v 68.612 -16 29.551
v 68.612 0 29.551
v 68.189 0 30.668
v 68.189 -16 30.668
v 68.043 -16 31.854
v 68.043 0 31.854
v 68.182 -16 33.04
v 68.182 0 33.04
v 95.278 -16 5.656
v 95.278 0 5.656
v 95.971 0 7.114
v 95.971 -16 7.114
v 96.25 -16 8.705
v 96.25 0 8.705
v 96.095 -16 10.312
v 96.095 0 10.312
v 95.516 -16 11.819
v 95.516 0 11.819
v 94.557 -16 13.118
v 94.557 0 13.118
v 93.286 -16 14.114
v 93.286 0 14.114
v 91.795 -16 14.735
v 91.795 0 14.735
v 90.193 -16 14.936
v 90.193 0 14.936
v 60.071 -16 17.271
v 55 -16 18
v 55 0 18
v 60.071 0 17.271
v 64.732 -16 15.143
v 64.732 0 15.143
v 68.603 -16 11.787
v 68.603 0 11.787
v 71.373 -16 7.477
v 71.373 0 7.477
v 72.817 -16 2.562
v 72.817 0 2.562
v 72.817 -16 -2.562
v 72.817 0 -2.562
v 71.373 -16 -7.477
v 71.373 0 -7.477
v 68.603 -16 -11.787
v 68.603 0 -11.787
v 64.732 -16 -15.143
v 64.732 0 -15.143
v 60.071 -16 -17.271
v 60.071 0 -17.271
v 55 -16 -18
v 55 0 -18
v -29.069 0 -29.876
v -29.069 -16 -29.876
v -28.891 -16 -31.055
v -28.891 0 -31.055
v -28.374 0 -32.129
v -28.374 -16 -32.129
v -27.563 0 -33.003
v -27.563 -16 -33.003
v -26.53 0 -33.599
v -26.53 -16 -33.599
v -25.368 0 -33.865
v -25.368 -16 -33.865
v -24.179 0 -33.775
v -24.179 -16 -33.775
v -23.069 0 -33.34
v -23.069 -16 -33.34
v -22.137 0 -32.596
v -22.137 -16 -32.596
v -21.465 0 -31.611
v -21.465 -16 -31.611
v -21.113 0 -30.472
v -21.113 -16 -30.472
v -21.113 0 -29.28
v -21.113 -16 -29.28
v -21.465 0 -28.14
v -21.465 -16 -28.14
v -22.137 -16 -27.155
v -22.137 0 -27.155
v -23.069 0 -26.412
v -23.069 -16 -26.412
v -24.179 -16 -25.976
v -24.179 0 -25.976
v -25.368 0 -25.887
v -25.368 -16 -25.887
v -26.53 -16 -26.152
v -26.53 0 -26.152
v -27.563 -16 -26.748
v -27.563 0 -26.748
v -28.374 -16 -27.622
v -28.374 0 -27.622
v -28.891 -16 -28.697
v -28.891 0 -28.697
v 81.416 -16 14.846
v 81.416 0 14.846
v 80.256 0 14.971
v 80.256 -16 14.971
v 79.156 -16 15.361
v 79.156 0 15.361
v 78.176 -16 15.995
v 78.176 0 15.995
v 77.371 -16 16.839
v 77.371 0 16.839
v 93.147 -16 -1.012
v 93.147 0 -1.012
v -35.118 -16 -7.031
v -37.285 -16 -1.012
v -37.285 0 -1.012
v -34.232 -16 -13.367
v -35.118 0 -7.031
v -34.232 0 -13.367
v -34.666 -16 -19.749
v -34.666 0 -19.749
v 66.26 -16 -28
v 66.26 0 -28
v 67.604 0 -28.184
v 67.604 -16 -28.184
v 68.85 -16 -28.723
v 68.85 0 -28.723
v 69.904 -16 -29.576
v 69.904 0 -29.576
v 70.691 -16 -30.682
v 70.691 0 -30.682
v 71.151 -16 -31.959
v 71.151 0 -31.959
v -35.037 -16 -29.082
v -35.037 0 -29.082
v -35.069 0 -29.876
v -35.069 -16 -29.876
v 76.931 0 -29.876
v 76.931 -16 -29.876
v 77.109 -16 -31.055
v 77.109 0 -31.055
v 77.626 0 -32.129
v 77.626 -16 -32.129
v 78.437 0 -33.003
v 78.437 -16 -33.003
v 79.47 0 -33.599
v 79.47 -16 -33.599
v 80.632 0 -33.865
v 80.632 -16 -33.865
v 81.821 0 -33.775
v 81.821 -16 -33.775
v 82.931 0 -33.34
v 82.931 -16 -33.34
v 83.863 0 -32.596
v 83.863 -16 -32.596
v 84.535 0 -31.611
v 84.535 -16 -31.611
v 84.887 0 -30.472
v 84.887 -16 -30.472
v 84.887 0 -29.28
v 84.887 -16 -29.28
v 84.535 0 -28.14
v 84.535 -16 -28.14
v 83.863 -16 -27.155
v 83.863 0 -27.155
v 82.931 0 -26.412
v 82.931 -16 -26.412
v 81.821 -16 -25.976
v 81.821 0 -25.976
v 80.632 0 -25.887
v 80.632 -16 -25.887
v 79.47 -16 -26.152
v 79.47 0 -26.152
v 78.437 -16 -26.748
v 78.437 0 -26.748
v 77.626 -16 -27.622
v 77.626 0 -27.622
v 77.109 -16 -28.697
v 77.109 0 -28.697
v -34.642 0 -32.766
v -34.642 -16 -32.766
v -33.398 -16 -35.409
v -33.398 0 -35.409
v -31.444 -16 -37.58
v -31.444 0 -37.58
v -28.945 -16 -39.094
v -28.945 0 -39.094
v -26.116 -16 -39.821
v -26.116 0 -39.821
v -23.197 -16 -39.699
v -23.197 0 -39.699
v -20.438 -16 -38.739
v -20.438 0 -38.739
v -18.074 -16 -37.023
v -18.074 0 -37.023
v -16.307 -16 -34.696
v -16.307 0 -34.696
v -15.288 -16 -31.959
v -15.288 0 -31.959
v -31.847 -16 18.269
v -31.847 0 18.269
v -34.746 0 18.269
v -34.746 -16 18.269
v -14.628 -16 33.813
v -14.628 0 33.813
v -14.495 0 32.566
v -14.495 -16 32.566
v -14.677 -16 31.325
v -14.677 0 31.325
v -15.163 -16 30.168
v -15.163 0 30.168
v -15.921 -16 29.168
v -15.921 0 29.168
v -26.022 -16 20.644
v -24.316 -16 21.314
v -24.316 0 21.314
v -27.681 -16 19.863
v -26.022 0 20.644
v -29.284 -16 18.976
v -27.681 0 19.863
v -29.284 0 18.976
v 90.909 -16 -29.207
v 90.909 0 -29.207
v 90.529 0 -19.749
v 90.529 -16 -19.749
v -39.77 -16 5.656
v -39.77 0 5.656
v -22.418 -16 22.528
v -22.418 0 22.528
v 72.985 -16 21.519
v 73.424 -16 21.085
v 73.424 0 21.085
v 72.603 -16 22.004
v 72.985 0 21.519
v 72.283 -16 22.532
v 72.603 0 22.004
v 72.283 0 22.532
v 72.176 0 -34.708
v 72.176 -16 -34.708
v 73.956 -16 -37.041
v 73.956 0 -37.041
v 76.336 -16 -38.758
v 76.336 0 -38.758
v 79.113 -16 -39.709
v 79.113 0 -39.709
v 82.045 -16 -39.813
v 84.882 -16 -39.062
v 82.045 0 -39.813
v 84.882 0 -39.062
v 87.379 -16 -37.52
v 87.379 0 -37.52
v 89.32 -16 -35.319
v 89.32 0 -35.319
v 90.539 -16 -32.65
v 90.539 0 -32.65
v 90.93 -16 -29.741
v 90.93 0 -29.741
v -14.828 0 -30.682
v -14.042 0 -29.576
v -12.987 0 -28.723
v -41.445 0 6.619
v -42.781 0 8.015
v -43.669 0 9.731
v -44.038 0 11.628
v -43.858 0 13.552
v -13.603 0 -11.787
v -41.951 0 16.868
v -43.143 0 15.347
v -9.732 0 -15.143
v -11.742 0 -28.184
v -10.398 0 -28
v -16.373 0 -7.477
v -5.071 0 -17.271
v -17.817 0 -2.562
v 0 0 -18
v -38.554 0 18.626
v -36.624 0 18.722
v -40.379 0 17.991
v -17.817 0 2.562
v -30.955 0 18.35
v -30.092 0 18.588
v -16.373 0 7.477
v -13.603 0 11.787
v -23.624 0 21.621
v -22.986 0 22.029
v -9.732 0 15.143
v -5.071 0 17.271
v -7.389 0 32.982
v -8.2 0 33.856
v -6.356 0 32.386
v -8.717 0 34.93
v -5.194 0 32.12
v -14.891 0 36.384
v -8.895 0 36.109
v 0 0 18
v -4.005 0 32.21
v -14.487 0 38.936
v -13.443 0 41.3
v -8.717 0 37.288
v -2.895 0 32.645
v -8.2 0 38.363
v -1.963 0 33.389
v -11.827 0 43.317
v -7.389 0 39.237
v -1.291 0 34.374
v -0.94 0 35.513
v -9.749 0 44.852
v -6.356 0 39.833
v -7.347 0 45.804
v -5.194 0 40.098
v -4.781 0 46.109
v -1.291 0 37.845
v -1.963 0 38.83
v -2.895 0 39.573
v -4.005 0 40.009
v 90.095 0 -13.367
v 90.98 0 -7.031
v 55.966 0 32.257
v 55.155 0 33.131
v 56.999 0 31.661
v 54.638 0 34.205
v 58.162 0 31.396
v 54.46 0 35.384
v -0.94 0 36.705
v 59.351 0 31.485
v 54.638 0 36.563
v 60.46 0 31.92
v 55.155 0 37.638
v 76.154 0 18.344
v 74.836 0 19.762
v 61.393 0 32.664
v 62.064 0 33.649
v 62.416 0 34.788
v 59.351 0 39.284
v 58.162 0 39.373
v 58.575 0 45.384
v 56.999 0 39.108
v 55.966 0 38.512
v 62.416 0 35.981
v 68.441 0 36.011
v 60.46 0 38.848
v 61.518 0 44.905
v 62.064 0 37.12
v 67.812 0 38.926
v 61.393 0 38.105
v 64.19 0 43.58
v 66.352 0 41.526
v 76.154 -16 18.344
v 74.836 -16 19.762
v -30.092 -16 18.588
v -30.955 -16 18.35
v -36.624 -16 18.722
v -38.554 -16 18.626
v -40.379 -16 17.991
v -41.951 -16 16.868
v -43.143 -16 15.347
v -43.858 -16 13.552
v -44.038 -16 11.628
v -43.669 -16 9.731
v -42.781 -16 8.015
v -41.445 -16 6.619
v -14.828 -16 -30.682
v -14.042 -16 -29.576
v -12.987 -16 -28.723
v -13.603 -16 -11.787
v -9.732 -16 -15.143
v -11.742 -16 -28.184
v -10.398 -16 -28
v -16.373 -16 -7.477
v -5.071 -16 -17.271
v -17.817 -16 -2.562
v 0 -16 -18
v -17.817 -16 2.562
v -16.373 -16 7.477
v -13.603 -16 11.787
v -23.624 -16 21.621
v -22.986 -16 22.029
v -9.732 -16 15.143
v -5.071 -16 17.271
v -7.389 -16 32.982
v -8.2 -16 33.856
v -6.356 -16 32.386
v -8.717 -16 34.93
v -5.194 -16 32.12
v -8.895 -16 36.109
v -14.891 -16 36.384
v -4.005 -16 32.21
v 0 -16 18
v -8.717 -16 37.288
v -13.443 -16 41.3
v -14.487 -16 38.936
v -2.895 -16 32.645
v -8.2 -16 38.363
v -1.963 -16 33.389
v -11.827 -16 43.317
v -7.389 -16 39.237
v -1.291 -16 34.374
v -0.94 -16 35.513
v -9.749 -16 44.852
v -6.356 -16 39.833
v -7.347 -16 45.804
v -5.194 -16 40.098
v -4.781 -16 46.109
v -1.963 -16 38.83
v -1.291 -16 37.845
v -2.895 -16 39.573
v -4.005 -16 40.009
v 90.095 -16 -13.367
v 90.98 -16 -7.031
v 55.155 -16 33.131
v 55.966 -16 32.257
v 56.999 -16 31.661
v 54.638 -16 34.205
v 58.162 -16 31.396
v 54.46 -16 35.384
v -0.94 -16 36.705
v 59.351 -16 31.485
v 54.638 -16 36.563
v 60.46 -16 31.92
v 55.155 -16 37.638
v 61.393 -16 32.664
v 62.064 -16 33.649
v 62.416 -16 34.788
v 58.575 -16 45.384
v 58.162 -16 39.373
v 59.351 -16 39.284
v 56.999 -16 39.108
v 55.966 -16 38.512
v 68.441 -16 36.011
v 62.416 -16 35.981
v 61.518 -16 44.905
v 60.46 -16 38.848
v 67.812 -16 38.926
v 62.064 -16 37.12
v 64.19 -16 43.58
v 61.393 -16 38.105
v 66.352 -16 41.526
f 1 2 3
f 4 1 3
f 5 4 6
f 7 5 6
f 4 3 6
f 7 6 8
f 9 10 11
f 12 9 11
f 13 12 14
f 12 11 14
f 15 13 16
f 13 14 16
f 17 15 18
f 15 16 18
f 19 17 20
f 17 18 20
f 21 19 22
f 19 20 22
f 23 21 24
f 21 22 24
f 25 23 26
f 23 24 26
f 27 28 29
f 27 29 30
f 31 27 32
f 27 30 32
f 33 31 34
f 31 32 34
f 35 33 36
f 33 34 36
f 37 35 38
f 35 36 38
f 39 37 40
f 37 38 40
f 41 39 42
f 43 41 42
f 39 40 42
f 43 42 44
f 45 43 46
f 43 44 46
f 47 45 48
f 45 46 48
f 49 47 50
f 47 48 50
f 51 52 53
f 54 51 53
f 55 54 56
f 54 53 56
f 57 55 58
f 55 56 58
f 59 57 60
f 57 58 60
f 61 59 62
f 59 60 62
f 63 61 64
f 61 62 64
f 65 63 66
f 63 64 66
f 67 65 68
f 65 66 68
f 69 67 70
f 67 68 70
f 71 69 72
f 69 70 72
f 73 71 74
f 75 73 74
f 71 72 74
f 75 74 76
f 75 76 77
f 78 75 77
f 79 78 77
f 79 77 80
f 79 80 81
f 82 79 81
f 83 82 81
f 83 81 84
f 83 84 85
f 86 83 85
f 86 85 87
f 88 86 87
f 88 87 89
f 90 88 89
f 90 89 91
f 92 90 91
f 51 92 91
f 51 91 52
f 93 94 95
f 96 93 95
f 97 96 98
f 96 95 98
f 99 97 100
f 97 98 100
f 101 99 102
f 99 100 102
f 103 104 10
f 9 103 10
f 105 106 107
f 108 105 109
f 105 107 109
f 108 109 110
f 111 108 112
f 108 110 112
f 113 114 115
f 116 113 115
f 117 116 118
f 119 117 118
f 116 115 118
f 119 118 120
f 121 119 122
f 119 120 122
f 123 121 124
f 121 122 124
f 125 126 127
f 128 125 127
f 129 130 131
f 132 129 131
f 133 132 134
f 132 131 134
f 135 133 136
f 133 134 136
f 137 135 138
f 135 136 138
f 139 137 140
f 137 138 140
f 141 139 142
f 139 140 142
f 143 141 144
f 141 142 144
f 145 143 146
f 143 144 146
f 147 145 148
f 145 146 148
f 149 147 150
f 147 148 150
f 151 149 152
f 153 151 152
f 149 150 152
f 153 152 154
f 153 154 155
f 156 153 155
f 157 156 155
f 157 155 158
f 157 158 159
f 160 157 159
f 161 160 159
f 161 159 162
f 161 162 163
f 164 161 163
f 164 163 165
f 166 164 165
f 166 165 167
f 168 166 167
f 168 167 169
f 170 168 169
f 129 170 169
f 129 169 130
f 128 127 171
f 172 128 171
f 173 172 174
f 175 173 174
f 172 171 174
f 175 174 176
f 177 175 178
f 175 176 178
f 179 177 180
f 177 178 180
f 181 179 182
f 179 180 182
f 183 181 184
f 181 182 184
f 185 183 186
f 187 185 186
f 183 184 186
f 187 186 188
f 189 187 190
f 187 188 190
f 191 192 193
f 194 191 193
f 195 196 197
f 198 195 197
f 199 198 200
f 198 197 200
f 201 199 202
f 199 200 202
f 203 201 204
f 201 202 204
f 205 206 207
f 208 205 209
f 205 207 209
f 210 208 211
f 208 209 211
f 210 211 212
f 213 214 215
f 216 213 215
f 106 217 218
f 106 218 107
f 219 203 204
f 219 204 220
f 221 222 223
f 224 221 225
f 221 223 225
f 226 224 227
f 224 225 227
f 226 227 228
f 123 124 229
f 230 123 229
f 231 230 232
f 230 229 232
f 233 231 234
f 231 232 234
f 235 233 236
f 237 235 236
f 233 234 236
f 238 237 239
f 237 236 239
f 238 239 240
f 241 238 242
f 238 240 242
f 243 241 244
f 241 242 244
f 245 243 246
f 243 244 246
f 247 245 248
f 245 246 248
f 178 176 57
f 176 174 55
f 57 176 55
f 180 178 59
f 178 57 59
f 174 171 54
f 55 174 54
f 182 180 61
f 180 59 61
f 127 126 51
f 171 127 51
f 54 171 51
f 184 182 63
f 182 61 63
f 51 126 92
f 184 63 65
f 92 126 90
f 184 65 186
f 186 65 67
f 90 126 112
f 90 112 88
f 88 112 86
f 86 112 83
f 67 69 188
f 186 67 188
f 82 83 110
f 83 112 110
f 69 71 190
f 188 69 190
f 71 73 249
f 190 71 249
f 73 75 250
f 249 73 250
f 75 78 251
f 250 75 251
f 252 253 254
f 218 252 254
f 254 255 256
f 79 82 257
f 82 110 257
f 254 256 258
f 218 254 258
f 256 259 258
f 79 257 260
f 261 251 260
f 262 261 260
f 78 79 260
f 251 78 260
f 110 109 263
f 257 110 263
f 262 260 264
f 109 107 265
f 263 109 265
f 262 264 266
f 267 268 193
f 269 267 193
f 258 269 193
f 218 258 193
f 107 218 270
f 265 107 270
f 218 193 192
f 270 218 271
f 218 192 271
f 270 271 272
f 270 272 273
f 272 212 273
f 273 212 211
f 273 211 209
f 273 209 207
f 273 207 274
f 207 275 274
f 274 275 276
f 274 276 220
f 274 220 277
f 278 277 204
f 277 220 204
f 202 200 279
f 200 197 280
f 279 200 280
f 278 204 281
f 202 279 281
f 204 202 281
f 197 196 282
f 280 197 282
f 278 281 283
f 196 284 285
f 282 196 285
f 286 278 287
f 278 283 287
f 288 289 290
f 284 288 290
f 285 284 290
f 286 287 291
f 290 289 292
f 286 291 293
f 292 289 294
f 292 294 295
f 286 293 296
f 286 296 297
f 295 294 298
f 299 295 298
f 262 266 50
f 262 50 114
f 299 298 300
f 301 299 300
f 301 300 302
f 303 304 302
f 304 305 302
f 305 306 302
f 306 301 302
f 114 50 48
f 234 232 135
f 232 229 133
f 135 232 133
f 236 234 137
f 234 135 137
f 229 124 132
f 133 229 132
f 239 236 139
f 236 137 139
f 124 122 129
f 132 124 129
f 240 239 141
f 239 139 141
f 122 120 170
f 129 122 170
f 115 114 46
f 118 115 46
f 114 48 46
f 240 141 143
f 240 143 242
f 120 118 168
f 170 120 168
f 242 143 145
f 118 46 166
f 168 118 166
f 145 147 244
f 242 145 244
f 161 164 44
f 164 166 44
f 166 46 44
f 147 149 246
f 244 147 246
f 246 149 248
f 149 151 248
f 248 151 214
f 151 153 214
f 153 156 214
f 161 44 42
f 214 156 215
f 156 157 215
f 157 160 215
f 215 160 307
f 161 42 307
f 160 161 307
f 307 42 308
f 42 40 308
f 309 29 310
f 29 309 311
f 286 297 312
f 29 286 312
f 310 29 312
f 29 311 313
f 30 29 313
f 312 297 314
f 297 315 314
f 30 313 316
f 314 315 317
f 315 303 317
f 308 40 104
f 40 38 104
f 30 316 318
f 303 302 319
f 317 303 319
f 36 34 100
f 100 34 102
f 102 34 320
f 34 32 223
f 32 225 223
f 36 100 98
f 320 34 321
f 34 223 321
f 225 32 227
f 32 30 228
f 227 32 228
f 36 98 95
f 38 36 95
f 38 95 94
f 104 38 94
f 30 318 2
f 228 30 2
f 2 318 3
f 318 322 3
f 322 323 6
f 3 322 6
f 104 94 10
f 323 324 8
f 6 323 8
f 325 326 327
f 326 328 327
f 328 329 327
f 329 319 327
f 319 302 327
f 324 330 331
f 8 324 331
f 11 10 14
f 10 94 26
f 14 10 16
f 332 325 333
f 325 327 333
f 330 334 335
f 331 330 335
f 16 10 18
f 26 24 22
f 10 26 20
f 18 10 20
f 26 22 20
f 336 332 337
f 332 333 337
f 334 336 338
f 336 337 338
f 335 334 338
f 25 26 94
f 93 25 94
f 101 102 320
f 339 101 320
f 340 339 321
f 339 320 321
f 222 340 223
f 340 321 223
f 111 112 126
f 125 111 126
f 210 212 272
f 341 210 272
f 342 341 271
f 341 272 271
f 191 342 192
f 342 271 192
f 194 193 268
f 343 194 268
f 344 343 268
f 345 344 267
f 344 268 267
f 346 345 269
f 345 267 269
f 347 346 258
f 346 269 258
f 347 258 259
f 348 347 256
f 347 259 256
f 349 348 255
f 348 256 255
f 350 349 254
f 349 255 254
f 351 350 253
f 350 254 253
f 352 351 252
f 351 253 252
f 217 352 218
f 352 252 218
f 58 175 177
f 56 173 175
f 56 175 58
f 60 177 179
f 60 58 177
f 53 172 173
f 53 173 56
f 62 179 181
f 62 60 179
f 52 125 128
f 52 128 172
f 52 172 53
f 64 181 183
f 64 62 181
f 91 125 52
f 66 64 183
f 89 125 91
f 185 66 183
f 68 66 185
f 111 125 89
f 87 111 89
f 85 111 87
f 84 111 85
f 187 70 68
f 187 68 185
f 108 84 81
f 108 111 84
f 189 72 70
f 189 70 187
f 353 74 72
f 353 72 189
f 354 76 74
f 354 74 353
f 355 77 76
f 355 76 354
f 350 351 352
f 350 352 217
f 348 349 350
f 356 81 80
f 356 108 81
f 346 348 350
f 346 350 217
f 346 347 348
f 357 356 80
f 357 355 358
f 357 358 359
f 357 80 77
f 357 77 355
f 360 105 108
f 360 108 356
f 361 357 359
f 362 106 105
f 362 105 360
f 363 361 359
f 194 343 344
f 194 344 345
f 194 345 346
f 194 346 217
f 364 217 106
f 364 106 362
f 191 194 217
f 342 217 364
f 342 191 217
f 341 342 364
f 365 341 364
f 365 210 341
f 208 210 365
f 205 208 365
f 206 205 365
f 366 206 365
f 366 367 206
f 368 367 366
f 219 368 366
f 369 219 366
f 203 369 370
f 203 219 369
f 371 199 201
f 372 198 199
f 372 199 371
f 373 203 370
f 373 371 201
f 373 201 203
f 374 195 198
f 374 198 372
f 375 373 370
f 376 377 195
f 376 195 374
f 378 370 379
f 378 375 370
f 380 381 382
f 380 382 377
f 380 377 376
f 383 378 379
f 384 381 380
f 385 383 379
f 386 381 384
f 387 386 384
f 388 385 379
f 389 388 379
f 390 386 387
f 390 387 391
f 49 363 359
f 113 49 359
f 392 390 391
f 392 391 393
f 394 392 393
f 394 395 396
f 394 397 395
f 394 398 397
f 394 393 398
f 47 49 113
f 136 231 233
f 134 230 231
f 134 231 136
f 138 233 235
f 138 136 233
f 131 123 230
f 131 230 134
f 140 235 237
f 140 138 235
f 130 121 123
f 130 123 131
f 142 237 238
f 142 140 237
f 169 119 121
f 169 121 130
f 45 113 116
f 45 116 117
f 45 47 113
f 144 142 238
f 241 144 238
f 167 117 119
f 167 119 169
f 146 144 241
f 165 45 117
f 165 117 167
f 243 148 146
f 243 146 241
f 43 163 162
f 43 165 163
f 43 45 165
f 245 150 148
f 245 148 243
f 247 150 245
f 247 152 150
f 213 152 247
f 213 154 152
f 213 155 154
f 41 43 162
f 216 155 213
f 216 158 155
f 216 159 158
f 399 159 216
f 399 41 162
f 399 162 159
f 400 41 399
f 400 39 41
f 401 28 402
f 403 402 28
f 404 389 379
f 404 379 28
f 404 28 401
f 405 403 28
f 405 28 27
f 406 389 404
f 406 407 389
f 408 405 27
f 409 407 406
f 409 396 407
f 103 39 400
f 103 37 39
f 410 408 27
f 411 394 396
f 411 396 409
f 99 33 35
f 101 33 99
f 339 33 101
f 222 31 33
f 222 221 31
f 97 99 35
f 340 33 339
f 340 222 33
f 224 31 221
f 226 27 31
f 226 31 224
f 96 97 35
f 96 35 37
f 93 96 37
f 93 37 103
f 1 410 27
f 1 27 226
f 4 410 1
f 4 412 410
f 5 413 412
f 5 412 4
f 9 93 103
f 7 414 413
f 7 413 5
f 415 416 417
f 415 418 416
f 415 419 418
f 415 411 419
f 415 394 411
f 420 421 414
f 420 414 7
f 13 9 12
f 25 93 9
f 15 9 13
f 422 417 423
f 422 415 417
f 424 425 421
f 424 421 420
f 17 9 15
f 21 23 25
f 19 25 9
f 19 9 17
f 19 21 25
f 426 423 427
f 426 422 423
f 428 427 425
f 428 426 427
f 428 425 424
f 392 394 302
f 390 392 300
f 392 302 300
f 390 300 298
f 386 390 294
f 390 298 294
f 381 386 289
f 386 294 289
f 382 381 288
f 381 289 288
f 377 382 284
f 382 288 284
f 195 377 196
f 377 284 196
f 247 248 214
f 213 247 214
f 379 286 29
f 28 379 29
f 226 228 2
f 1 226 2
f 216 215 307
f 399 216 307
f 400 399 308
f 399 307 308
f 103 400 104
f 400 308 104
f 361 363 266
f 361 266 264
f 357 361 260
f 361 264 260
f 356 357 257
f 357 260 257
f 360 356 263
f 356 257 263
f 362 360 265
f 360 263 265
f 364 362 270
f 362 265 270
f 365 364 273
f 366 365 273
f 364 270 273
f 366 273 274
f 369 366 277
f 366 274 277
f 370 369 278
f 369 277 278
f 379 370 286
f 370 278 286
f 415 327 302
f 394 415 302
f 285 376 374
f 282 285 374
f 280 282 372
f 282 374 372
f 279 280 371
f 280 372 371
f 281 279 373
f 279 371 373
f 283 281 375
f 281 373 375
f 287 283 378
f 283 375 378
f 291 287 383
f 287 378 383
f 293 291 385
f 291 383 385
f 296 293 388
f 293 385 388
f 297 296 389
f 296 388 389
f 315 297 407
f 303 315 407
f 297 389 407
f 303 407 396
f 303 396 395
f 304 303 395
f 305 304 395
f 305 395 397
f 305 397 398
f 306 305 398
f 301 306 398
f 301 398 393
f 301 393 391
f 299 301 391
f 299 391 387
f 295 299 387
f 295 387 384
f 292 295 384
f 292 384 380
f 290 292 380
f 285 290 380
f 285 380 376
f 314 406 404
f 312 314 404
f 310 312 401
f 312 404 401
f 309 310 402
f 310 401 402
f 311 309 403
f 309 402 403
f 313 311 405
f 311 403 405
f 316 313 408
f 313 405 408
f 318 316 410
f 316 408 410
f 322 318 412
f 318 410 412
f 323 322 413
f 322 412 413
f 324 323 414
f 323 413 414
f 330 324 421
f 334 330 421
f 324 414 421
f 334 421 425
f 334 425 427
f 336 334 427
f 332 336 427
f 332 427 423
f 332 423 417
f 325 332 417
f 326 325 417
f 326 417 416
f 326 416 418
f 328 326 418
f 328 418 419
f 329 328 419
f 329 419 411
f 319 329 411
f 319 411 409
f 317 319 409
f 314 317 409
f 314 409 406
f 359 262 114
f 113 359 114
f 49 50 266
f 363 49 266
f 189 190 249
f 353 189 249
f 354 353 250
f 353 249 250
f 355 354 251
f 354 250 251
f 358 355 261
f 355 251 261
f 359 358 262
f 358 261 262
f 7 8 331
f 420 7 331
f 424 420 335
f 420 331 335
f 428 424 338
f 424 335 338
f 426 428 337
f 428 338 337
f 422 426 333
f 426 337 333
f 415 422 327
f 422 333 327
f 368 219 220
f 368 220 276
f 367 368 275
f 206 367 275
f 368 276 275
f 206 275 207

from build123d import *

# Parameters (mm, degrees)
F1_DEPTH = 16
F2_D     = 8


with BuildPart() as f1:
    # F0 (on Front) → F1 (new body)
    with BuildSketch(Plane.XZ):
        with BuildLine():
            Line((-34.6662172288, -19.7492731154), (-35.0371696448, -29.0820410001))
            Line((-35.0371696448, -29.0820410001), (-35.0687167778, -29.8757332816))
            ThreePointArc((-35.0687167778, -29.8757332816), (-26.1158964536, -39.8207528757), (-15.2880338325, -31.9585777605))
            ThreePointArc((-15.2880338325, -31.9585777605), (-13.5435538319, -29.1136706781), (-10.3976923598, -28))
            Line((-10.3976923598, -28), (27.5, -28))
            Line((27.5, -28), (66.2602588043, -28))
            ThreePointArc((66.2602588043, -28), (69.4061202763, -29.1136706781), (71.1506002769, -31.9585777605))
            ThreePointArc((71.1506002769, -31.9585777605), (82.0453345687, -39.8134840129), (90.9303783011, -29.7412059492))
            Line((90.9303783011, -29.7412059492), (90.9089219451, -29.2073580015))
            Line((90.9089219451, -29.2073580015), (90.5287836732, -19.7492731154))
            ThreePointArc((90.5287836732, -19.7492731154), (90.3735319415, -10.1758034804), (93.147096282, -1.0115923959))
            Line((93.147096282, -1.0115923959), (95.278469332, 5.6560345374))
            ThreePointArc((95.278469332, 5.6560345374), (95.5161813728, 11.819450524), (90.1933378417, 14.9357849705))
            Line((90.1933378417, 14.9357849705), (81.4161891549, 14.8464442463))
            ThreePointArc((81.4161891549, 14.8464442463), (79.1559436107, 15.3607918631), (77.3705557582, 16.8391874825))
            ThreePointArc((77.3705557582, 16.8391874825), (75.5074057352, 19.0642678855), (73.4239499151, 21.084545751))
            ThreePointArc((73.4239499151, 21.084545751), (72.7864222514, 21.7553586843), (72.2834406198, 22.5321733286))
            Line((72.2834406198, 22.5321733286), (68.6120607815, 29.5510562145))
            ThreePointArc((68.6120607815, 29.5510562145), (68.0801346369, 31.2567064537), (68.1818484569, 33.0404784292))
            ThreePointArc((68.1818484569, 33.0404784292), (66.351866653, 41.5264608231), (58.5748353368, 45.3837285735))
            Line((58.5748353368, 45.3837285735), (-4.7806569197, 46.1086403504))
            ThreePointArc((-4.7806569197, 46.1086403504), (-12.7004054077, 42.360432851), (-14.6278820787, 33.813134491))
            ThreePointArc((-14.6278820787, 33.813134491), (-14.6773480259, 31.3245006562), (-15.9205954248, 29.168095975))
            Line((-15.9205954248, 29.168095975), (-22.4176771662, 22.5284468379))
            ThreePointArc((-22.4176771662, 22.5284468379), (-23.2975488941, 21.8131223673), (-24.3159760704, 21.3144547002))
            ThreePointArc((-24.3159760704, 21.3144547002), (-26.857680899, 20.2673049491), (-29.284454025, 18.9759652448))
            ThreePointArc((-29.284454025, 18.9759652448), (-30.5179442619, 18.4492237754), (-31.8470764444, 18.2693283014))
            Line((-31.8470764444, 18.2693283014), (-34.7455926018, 18.2693283014))
            ThreePointArc((-34.7455926018, 18.2693283014), (-43.5642704506, 14.4747123862), (-39.7696545355, 5.6560345374))
            Line((-39.7696545355, 5.6560345374), (-37.2845298375, -1.0115923959))
            ThreePointArc((-37.2845298375, -1.0115923959), (-34.510965497, -10.1758034804), (-34.6662172288, -19.7492731154))
        make_face()
        with BuildLine():
            ThreePointArc((0, -18), (-18, 0), (0, 18))
            Line((0, 18), (55, 18))
            ThreePointArc((55, 18), (73, 0), (55, -18))
            Line((55, -18), (0, -18))
        make_face(mode=Mode.SUBTRACT)
    extrude(amount=F1_DEPTH)

    # F2 (through all)
    with Locations(Plane(origin=(0, 0, 0), x_dir=(1, 0, 0), z_dir=(0, 1, 0))):
        with Locations((58.4604231045, -35.3843831029), (-4.8950691519, -36.1092948798), (-25.0687167778, 29.8757332816), (80.9312832222, 29.8757332816)):
            Hole(F2_D / 2)


solid = f1.part
